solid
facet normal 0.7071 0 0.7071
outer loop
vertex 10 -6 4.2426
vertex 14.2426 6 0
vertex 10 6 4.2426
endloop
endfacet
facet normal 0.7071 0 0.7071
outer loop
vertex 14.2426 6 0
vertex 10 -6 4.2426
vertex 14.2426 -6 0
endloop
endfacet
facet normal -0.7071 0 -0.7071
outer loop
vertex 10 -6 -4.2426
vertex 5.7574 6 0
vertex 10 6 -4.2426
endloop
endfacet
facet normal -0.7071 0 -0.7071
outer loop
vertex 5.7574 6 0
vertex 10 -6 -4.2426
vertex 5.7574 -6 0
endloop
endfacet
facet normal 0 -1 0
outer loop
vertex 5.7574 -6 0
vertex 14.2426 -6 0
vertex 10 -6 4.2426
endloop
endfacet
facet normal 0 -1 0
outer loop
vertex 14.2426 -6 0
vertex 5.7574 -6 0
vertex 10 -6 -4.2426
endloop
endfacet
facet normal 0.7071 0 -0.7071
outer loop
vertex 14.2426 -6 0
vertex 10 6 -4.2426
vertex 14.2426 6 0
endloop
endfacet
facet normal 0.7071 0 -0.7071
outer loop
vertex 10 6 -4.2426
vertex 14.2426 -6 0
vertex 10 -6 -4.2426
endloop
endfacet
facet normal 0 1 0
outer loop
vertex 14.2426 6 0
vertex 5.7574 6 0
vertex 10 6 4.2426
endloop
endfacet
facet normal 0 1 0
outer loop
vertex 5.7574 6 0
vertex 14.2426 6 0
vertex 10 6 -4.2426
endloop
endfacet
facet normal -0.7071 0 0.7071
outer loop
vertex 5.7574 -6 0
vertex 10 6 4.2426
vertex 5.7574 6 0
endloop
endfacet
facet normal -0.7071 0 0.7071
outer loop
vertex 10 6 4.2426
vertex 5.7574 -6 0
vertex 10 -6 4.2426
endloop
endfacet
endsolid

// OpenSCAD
translate([10, 0, 0]) rotate([0, 45, 0]) scale([1, 2, 1]) cube([6, 6, 6], center = true);
